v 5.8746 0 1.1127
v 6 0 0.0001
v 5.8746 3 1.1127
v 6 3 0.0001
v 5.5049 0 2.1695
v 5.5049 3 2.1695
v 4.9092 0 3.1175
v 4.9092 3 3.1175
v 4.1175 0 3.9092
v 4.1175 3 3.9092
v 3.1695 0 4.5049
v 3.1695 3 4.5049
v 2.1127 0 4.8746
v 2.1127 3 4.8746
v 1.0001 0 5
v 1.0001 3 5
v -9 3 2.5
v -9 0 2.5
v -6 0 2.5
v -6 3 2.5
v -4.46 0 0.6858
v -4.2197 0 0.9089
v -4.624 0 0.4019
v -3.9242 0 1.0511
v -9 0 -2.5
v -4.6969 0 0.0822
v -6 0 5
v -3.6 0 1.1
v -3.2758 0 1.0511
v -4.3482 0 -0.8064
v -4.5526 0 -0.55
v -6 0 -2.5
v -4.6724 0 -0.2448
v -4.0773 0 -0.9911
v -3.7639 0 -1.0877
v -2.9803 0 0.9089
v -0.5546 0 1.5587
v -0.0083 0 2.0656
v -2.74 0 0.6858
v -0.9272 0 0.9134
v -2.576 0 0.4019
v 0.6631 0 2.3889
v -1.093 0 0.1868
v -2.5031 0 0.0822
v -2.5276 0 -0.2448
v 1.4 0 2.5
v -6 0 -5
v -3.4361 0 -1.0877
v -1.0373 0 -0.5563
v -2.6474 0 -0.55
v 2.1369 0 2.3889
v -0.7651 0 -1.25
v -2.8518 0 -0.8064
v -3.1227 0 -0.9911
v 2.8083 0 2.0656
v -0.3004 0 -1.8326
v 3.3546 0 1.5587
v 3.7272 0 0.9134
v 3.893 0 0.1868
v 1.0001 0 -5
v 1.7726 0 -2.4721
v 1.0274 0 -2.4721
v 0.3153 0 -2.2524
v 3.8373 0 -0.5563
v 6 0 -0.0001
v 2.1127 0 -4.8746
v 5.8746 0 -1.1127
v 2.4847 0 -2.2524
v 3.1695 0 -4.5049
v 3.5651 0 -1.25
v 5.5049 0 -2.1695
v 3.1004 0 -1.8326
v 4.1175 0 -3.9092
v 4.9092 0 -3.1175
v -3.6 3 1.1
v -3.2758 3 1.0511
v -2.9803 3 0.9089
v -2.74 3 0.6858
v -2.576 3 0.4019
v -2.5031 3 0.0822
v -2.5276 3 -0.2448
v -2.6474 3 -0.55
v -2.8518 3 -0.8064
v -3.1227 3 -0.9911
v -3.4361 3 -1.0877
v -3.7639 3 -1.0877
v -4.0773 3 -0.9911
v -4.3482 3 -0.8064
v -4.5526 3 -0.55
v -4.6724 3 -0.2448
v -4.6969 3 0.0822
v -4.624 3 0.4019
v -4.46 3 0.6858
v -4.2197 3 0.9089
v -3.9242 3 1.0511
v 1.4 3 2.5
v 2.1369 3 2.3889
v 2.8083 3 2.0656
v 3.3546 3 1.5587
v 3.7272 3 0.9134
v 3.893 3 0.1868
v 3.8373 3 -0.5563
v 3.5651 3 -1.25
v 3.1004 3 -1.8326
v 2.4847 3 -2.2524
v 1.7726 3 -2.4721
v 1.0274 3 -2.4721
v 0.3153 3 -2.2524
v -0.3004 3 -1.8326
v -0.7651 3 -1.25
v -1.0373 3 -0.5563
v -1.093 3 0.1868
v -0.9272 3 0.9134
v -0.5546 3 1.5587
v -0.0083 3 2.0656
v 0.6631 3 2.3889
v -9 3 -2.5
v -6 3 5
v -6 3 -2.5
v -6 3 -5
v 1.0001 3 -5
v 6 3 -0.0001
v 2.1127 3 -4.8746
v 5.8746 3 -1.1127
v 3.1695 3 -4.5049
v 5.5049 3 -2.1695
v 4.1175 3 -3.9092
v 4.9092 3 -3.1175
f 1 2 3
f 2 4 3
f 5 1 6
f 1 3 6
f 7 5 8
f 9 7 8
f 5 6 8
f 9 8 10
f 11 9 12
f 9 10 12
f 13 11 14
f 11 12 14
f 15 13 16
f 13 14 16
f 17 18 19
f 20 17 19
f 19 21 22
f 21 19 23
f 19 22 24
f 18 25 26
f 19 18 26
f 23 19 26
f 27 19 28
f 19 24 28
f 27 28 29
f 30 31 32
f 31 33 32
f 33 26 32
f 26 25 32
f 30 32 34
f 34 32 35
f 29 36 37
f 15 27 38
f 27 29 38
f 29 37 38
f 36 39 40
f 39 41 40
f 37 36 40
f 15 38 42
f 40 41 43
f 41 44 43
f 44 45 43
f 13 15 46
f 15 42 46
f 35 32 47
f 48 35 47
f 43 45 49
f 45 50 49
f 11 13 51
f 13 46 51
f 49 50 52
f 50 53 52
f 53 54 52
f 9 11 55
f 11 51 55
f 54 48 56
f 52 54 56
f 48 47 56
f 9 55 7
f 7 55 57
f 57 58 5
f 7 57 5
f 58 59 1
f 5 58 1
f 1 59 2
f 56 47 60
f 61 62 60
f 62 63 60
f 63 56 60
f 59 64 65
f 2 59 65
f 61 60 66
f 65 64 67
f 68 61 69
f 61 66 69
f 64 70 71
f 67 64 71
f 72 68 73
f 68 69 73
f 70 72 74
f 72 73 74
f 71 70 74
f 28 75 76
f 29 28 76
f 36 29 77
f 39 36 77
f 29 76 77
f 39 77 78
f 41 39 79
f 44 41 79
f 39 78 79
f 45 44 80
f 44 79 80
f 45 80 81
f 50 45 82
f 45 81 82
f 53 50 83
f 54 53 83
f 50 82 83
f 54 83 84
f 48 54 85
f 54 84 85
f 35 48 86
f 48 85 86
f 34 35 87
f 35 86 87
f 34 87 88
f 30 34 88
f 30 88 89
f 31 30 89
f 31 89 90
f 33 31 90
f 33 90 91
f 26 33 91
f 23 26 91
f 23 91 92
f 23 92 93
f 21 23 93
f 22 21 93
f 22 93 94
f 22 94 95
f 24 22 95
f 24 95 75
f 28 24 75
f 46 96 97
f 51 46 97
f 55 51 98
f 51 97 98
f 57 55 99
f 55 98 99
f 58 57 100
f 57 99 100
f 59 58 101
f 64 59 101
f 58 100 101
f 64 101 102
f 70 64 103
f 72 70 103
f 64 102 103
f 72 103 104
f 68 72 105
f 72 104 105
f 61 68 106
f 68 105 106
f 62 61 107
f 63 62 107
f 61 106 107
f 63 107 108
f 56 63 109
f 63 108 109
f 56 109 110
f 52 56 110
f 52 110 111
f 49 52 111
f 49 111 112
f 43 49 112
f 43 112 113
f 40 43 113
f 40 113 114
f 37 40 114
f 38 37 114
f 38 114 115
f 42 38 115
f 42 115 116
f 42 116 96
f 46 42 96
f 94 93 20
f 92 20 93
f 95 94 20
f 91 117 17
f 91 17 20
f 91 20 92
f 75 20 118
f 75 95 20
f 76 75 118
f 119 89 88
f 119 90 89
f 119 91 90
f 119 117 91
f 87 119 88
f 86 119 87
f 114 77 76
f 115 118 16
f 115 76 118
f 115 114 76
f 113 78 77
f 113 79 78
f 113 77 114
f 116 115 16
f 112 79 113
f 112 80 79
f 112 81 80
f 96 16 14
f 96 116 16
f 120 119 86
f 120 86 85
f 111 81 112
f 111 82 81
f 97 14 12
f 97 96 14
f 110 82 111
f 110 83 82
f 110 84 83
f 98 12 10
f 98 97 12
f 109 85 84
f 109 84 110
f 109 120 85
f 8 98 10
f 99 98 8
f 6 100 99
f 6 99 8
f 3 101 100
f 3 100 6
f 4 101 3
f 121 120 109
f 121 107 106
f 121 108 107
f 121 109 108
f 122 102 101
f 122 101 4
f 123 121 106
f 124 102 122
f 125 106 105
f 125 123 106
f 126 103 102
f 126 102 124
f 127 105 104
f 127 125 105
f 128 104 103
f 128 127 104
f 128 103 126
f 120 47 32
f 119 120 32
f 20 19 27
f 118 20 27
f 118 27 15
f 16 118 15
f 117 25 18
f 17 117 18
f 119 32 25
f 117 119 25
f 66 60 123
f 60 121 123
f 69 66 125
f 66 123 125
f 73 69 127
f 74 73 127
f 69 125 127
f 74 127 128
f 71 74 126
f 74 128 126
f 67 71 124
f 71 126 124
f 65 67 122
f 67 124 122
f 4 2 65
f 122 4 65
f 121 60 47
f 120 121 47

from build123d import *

# Parameters (mm, degrees)
SALIENTE_EXTRUIR1_DEPTH = 3
CROQUIS2_R              = 2.5
CROQUIS2_R_2            = 1.1
CORTAR_EXTRUIR1_DEPTH   = 10
REDONDEO1_R             = 5


with BuildPart() as part:
    # Croquis1 → Saliente-Extruir1 (new body)
    with BuildSketch(Plane(origin=(0, 0, 0), x_dir=(1, 0, 0), z_dir=(0, 1, 0))):
        Polygon((-6, 5), (-6, 2.5), (-9, 2.5), (-9, -2.5), (-6, -2.5), (-6, -5), (6, -5), (6, 5), align=None)
    extrude(amount=SALIENTE_EXTRUIR1_DEPTH)

    # Croquis2 → Cortar-Extruir1 (cut)
    with BuildSketch(Plane(origin=(0, 3, 0), x_dir=(1, 0, 0), z_dir=(0, 1, 0))):
        with Locations(Location((1.4, 0, 0), (0, 0, 270))):
            Circle(CROQUIS2_R)
        with Locations(Location((-3.6, 0, 0), (0, 0, 270))):
            Circle(CROQUIS2_R_2)
    extrude(amount=-CORTAR_EXTRUIR1_DEPTH, mode=Mode.SUBTRACT)

    # Redondeo1
    redondeo1_edges = [part.edges().sort_by_distance(p)[0] for p in [
        (6, 1.5, -5),
        (6, 1.5, 5),
    ]]
    fillet(redondeo1_edges, radius=REDONDEO1_R - 0.0001)  # a hair under: the kernel refuses the full size


solid = part.part
